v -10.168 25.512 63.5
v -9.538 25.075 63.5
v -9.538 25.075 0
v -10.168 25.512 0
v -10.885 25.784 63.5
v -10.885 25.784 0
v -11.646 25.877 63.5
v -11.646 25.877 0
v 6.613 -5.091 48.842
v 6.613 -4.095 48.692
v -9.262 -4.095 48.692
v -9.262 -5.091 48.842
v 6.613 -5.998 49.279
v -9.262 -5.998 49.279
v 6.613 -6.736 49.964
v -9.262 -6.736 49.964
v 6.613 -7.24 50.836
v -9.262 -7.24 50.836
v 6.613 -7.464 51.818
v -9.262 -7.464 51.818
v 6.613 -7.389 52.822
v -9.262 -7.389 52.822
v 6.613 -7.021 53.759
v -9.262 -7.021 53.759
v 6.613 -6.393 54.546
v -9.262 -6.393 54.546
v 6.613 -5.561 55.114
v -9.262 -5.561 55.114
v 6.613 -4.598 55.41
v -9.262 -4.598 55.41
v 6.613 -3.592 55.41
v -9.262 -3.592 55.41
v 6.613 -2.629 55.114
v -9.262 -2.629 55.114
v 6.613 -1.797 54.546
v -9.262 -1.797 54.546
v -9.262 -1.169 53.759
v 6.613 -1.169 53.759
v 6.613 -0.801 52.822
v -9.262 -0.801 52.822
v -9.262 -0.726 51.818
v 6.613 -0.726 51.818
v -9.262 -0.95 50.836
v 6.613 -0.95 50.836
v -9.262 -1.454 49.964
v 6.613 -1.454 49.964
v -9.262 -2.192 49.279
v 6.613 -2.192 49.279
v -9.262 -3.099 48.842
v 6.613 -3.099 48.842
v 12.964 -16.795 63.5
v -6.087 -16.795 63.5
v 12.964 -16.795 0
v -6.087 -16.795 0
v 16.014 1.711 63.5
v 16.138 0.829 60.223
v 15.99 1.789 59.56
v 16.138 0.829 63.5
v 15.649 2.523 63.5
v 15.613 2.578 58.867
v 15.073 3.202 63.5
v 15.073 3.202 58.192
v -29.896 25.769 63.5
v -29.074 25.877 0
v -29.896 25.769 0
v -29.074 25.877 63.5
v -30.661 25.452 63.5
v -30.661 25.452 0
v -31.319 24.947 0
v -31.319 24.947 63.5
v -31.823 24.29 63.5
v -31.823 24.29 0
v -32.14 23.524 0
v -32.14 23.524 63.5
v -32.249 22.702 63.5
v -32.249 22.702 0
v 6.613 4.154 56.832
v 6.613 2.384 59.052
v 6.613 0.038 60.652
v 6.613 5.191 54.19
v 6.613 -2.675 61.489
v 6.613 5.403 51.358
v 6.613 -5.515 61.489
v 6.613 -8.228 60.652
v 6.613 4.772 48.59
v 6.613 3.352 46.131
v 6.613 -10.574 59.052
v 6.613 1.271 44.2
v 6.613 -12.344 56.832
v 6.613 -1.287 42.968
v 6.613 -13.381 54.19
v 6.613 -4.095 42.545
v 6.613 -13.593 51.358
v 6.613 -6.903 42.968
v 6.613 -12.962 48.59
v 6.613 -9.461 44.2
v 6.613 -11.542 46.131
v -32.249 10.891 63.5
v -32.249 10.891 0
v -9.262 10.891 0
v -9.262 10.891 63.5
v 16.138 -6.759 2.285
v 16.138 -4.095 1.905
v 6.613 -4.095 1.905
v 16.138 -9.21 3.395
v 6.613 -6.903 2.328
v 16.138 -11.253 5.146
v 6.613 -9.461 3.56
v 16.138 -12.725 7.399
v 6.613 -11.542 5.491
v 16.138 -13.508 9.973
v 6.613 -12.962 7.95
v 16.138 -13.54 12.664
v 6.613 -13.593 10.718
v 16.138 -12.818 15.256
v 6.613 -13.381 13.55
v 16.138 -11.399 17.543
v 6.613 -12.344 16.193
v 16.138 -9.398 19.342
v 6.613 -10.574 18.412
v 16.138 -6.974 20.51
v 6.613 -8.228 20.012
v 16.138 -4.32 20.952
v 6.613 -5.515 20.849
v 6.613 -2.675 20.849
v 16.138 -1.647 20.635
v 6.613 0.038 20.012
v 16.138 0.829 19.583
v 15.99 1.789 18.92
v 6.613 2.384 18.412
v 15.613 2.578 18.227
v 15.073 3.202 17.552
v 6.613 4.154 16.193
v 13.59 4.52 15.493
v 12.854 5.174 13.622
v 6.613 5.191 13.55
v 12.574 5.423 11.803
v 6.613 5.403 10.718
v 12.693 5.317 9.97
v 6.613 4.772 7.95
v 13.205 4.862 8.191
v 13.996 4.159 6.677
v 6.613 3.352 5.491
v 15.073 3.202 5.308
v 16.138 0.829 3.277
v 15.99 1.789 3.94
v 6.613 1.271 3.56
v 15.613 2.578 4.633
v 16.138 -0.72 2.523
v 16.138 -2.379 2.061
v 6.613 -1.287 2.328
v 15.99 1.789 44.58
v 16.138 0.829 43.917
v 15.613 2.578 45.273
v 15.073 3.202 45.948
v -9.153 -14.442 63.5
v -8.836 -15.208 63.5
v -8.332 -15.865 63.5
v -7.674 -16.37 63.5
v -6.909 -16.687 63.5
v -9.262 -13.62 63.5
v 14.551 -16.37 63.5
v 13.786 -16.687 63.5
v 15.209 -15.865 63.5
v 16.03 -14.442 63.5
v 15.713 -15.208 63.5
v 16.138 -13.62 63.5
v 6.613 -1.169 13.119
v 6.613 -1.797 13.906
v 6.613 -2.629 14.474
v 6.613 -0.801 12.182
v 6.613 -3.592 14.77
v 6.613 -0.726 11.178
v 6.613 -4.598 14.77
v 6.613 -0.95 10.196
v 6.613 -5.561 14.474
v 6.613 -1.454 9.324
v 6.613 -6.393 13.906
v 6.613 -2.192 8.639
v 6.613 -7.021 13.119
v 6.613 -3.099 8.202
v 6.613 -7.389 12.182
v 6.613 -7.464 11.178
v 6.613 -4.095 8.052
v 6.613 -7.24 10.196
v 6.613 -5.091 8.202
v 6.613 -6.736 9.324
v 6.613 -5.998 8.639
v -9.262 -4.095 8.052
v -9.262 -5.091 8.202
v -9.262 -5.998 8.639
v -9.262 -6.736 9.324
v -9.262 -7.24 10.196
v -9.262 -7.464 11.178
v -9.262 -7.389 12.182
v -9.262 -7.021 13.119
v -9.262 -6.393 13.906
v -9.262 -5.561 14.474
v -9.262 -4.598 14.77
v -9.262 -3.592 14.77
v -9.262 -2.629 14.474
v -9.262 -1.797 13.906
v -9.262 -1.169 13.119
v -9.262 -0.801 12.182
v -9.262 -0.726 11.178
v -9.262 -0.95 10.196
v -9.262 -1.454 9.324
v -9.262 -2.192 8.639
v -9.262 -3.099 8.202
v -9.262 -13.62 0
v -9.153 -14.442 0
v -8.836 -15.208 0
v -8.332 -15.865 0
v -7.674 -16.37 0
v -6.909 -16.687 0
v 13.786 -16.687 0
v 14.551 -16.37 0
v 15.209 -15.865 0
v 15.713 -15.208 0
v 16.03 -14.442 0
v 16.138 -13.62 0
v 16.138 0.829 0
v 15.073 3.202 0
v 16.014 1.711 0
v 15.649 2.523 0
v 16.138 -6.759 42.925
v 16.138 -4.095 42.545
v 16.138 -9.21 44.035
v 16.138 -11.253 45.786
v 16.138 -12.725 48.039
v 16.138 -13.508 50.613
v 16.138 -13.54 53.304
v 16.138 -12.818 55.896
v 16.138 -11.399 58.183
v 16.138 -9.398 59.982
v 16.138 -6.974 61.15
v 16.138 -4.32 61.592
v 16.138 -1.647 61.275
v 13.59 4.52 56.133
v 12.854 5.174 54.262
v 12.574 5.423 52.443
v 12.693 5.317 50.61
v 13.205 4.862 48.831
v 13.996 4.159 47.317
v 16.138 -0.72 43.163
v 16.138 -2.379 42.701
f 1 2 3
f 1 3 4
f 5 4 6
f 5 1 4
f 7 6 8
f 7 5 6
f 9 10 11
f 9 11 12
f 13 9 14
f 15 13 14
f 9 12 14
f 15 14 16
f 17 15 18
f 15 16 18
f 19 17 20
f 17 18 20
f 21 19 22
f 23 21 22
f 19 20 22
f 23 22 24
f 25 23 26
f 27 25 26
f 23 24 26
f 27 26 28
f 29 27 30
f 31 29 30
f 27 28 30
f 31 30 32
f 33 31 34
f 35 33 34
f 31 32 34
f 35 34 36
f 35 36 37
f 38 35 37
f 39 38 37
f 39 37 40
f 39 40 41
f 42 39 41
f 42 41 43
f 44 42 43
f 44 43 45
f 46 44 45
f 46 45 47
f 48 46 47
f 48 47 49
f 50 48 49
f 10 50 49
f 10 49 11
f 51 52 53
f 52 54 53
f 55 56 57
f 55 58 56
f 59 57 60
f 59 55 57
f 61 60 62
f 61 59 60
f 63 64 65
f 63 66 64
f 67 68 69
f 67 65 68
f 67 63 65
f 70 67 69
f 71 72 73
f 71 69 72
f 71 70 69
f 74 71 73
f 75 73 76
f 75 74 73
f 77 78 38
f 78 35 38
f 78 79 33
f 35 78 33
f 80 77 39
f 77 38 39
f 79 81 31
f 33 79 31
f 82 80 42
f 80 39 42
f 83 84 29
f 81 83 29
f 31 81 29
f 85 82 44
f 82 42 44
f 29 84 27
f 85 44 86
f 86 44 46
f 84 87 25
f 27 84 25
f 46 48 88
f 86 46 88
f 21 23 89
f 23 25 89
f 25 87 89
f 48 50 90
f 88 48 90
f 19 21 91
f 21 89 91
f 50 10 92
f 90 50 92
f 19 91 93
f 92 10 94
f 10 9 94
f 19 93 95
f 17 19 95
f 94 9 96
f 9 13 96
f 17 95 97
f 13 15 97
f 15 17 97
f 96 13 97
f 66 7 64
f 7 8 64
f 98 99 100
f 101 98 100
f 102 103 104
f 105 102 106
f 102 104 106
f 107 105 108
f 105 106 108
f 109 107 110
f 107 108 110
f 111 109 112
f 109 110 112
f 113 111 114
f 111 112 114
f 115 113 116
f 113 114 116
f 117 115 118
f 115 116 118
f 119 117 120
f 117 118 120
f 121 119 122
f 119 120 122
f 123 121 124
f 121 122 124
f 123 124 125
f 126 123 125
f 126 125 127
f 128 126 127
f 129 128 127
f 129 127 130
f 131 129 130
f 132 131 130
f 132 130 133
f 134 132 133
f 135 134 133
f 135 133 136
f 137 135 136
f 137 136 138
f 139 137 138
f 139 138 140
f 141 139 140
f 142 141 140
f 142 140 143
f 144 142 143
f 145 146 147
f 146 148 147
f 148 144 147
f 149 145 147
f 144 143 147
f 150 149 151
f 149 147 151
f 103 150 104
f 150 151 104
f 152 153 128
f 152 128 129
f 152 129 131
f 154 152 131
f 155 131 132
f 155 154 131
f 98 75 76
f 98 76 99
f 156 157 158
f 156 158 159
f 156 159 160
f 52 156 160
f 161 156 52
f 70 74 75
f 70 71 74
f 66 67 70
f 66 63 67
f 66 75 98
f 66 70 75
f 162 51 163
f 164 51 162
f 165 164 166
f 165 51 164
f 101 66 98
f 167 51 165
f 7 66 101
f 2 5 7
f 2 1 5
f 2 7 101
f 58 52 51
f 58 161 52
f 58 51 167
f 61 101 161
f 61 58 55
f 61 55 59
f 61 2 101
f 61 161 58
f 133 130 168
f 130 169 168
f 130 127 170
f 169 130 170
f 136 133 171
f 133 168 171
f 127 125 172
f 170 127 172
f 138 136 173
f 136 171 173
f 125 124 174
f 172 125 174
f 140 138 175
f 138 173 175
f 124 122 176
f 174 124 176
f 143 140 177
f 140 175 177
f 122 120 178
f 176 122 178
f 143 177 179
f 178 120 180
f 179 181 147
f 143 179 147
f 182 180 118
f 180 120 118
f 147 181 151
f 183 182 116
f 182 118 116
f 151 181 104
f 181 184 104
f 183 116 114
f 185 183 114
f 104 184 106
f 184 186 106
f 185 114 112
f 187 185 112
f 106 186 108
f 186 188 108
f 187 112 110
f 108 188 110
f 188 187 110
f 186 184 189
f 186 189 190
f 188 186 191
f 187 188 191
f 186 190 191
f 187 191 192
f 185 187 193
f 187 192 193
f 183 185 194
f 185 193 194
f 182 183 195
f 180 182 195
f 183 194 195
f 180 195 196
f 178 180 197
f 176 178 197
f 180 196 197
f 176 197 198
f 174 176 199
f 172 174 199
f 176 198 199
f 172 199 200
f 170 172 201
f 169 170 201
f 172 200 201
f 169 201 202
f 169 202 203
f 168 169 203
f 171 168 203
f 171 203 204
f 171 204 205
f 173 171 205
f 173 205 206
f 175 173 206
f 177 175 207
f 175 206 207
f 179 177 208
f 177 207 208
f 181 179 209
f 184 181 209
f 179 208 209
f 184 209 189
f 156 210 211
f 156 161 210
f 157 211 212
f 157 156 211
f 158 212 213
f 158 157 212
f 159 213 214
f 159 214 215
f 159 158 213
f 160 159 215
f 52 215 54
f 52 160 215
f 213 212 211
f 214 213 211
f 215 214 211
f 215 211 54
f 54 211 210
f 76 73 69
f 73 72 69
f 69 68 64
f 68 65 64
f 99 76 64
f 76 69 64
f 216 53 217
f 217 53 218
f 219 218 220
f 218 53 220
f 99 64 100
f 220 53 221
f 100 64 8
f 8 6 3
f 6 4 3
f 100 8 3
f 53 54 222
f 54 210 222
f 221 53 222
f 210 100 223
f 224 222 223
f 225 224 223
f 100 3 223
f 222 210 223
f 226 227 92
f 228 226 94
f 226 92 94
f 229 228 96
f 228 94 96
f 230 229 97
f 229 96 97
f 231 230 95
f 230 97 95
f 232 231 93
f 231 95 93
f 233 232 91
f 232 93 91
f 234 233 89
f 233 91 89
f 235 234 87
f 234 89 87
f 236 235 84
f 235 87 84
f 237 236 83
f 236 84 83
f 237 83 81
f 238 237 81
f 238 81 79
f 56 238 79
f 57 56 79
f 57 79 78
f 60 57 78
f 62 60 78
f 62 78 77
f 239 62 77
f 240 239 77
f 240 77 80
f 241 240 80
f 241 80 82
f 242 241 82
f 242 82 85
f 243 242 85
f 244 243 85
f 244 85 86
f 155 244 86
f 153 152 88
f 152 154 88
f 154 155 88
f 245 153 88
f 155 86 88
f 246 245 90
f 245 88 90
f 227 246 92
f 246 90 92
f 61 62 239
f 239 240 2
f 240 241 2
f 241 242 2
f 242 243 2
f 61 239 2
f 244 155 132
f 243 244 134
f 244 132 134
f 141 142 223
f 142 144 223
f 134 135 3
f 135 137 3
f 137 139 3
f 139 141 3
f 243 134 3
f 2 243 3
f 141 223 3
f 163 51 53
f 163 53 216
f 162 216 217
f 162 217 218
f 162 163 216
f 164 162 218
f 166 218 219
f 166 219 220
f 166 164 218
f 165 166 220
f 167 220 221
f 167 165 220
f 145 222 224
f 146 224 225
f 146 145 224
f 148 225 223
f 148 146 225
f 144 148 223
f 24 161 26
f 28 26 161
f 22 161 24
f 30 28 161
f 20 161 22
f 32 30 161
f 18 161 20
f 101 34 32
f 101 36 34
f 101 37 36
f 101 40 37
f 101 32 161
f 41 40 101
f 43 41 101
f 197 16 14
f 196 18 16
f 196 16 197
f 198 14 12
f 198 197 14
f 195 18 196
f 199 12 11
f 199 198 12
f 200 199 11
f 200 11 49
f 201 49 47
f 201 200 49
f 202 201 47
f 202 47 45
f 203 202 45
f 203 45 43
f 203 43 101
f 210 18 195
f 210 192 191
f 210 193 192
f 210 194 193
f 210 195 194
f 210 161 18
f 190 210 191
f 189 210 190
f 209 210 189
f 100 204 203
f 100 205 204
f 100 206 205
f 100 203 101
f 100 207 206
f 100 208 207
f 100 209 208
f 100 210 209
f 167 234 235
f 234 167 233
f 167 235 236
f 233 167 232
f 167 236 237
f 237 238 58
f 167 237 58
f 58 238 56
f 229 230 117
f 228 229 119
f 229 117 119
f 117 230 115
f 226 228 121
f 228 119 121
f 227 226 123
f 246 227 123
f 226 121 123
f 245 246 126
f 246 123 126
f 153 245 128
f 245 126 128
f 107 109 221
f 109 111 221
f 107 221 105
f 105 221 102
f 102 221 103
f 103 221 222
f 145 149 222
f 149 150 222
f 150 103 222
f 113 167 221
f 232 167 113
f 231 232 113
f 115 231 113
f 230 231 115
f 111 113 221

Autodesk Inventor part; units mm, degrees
ref_plane "YZ Plane" through (0, 0, 0) normal (1, 0, 0) x (0, 1, 0)
ref_plane "XZ Plane" through (0, 0, 0) normal (0, 1, 0) x (-1, 0, 0)
ref_plane "XY Plane" through (0, 0, 0) normal (0, 0, 1) x (1, 0, 0)
sketch "Sketch1" plane through (0, 0, 0) normal (0, 0, 1) x (1, 0, 0)
  line L0 (-9.2616, -16.795) -> (16.1384, -16.795)
  line L1 (16.1384, -16.795) -> (16.1384, 2.255)
  line L2 (16.1384, 2.255) -> (-10.4396, 25.877)
  line L3 (-10.4396, 25.877) -> (-32.2486, 25.877)
  line L4 (-32.2486, 25.877) -> (-32.2486, 10.891)
  line L5 (-32.2486, 10.891) -> (-9.2616, 10.891)
  line L6 (-9.2616, -16.795) -> (-9.2616, 10.891)
  dimension "d39" = 25.4
  dimension "d40" = 22.987
  dimension "d42" = 27.686
  dimension "d43" = 14.986
  dimension "d45" = 48.37
  dimension "d46" = 19.05
extrude "Extrusion1" add sketch "Sketch1" along normal blind 63.5
sketch "Sketch5" plane through (16.1384, -16.795, 0) normal (1, 0, 0) x (0, 0, -1)
  line L0 (0, 0) -> (-63.5, 0) projected
  line L1 (-63.5, 0) -> (-63.5, 19.05) projected
  line L2 (-63.5, 0) -> (-52.07, 12.7) construction
  line L3 (-52.07, 12.7) -> (-11.43, 12.7) construction
  line L4 (0, 0) -> (0, 19.05) construction
  line L5 (-11.43, 12.7) -> (0, 0) construction
  point P0 (0, 16.795)
  dimension "d47" = 12.7
  dimension "d48" = 11.43
hole "Hole3" at (16.1384, -4.095, 52.07) at (16.1384, -4.095, 11.43) direction (-1, 0, 0) diameter 6.7564 end through all counterbore diameter 19.05 counterbore depth 9.525 clearance for "Hex Head Bolt" size "1/4" standard "Ansi Unified Screw Threads"
fillet "Fillet2" radius 3.175 7 edges at (16.1384, 2.255, 31.75) (16.1384, 2.255, 61.3348) (16.1384, 2.255, 2.1652) (16.1384, -16.795, 31.75) (-9.2616, -16.795, 31.75) (-10.4396, 25.877, 31.75) (-32.2486, 25.877, 31.75)
properties part number "C29_TK_BackWedge" material "ABS Plastic"
